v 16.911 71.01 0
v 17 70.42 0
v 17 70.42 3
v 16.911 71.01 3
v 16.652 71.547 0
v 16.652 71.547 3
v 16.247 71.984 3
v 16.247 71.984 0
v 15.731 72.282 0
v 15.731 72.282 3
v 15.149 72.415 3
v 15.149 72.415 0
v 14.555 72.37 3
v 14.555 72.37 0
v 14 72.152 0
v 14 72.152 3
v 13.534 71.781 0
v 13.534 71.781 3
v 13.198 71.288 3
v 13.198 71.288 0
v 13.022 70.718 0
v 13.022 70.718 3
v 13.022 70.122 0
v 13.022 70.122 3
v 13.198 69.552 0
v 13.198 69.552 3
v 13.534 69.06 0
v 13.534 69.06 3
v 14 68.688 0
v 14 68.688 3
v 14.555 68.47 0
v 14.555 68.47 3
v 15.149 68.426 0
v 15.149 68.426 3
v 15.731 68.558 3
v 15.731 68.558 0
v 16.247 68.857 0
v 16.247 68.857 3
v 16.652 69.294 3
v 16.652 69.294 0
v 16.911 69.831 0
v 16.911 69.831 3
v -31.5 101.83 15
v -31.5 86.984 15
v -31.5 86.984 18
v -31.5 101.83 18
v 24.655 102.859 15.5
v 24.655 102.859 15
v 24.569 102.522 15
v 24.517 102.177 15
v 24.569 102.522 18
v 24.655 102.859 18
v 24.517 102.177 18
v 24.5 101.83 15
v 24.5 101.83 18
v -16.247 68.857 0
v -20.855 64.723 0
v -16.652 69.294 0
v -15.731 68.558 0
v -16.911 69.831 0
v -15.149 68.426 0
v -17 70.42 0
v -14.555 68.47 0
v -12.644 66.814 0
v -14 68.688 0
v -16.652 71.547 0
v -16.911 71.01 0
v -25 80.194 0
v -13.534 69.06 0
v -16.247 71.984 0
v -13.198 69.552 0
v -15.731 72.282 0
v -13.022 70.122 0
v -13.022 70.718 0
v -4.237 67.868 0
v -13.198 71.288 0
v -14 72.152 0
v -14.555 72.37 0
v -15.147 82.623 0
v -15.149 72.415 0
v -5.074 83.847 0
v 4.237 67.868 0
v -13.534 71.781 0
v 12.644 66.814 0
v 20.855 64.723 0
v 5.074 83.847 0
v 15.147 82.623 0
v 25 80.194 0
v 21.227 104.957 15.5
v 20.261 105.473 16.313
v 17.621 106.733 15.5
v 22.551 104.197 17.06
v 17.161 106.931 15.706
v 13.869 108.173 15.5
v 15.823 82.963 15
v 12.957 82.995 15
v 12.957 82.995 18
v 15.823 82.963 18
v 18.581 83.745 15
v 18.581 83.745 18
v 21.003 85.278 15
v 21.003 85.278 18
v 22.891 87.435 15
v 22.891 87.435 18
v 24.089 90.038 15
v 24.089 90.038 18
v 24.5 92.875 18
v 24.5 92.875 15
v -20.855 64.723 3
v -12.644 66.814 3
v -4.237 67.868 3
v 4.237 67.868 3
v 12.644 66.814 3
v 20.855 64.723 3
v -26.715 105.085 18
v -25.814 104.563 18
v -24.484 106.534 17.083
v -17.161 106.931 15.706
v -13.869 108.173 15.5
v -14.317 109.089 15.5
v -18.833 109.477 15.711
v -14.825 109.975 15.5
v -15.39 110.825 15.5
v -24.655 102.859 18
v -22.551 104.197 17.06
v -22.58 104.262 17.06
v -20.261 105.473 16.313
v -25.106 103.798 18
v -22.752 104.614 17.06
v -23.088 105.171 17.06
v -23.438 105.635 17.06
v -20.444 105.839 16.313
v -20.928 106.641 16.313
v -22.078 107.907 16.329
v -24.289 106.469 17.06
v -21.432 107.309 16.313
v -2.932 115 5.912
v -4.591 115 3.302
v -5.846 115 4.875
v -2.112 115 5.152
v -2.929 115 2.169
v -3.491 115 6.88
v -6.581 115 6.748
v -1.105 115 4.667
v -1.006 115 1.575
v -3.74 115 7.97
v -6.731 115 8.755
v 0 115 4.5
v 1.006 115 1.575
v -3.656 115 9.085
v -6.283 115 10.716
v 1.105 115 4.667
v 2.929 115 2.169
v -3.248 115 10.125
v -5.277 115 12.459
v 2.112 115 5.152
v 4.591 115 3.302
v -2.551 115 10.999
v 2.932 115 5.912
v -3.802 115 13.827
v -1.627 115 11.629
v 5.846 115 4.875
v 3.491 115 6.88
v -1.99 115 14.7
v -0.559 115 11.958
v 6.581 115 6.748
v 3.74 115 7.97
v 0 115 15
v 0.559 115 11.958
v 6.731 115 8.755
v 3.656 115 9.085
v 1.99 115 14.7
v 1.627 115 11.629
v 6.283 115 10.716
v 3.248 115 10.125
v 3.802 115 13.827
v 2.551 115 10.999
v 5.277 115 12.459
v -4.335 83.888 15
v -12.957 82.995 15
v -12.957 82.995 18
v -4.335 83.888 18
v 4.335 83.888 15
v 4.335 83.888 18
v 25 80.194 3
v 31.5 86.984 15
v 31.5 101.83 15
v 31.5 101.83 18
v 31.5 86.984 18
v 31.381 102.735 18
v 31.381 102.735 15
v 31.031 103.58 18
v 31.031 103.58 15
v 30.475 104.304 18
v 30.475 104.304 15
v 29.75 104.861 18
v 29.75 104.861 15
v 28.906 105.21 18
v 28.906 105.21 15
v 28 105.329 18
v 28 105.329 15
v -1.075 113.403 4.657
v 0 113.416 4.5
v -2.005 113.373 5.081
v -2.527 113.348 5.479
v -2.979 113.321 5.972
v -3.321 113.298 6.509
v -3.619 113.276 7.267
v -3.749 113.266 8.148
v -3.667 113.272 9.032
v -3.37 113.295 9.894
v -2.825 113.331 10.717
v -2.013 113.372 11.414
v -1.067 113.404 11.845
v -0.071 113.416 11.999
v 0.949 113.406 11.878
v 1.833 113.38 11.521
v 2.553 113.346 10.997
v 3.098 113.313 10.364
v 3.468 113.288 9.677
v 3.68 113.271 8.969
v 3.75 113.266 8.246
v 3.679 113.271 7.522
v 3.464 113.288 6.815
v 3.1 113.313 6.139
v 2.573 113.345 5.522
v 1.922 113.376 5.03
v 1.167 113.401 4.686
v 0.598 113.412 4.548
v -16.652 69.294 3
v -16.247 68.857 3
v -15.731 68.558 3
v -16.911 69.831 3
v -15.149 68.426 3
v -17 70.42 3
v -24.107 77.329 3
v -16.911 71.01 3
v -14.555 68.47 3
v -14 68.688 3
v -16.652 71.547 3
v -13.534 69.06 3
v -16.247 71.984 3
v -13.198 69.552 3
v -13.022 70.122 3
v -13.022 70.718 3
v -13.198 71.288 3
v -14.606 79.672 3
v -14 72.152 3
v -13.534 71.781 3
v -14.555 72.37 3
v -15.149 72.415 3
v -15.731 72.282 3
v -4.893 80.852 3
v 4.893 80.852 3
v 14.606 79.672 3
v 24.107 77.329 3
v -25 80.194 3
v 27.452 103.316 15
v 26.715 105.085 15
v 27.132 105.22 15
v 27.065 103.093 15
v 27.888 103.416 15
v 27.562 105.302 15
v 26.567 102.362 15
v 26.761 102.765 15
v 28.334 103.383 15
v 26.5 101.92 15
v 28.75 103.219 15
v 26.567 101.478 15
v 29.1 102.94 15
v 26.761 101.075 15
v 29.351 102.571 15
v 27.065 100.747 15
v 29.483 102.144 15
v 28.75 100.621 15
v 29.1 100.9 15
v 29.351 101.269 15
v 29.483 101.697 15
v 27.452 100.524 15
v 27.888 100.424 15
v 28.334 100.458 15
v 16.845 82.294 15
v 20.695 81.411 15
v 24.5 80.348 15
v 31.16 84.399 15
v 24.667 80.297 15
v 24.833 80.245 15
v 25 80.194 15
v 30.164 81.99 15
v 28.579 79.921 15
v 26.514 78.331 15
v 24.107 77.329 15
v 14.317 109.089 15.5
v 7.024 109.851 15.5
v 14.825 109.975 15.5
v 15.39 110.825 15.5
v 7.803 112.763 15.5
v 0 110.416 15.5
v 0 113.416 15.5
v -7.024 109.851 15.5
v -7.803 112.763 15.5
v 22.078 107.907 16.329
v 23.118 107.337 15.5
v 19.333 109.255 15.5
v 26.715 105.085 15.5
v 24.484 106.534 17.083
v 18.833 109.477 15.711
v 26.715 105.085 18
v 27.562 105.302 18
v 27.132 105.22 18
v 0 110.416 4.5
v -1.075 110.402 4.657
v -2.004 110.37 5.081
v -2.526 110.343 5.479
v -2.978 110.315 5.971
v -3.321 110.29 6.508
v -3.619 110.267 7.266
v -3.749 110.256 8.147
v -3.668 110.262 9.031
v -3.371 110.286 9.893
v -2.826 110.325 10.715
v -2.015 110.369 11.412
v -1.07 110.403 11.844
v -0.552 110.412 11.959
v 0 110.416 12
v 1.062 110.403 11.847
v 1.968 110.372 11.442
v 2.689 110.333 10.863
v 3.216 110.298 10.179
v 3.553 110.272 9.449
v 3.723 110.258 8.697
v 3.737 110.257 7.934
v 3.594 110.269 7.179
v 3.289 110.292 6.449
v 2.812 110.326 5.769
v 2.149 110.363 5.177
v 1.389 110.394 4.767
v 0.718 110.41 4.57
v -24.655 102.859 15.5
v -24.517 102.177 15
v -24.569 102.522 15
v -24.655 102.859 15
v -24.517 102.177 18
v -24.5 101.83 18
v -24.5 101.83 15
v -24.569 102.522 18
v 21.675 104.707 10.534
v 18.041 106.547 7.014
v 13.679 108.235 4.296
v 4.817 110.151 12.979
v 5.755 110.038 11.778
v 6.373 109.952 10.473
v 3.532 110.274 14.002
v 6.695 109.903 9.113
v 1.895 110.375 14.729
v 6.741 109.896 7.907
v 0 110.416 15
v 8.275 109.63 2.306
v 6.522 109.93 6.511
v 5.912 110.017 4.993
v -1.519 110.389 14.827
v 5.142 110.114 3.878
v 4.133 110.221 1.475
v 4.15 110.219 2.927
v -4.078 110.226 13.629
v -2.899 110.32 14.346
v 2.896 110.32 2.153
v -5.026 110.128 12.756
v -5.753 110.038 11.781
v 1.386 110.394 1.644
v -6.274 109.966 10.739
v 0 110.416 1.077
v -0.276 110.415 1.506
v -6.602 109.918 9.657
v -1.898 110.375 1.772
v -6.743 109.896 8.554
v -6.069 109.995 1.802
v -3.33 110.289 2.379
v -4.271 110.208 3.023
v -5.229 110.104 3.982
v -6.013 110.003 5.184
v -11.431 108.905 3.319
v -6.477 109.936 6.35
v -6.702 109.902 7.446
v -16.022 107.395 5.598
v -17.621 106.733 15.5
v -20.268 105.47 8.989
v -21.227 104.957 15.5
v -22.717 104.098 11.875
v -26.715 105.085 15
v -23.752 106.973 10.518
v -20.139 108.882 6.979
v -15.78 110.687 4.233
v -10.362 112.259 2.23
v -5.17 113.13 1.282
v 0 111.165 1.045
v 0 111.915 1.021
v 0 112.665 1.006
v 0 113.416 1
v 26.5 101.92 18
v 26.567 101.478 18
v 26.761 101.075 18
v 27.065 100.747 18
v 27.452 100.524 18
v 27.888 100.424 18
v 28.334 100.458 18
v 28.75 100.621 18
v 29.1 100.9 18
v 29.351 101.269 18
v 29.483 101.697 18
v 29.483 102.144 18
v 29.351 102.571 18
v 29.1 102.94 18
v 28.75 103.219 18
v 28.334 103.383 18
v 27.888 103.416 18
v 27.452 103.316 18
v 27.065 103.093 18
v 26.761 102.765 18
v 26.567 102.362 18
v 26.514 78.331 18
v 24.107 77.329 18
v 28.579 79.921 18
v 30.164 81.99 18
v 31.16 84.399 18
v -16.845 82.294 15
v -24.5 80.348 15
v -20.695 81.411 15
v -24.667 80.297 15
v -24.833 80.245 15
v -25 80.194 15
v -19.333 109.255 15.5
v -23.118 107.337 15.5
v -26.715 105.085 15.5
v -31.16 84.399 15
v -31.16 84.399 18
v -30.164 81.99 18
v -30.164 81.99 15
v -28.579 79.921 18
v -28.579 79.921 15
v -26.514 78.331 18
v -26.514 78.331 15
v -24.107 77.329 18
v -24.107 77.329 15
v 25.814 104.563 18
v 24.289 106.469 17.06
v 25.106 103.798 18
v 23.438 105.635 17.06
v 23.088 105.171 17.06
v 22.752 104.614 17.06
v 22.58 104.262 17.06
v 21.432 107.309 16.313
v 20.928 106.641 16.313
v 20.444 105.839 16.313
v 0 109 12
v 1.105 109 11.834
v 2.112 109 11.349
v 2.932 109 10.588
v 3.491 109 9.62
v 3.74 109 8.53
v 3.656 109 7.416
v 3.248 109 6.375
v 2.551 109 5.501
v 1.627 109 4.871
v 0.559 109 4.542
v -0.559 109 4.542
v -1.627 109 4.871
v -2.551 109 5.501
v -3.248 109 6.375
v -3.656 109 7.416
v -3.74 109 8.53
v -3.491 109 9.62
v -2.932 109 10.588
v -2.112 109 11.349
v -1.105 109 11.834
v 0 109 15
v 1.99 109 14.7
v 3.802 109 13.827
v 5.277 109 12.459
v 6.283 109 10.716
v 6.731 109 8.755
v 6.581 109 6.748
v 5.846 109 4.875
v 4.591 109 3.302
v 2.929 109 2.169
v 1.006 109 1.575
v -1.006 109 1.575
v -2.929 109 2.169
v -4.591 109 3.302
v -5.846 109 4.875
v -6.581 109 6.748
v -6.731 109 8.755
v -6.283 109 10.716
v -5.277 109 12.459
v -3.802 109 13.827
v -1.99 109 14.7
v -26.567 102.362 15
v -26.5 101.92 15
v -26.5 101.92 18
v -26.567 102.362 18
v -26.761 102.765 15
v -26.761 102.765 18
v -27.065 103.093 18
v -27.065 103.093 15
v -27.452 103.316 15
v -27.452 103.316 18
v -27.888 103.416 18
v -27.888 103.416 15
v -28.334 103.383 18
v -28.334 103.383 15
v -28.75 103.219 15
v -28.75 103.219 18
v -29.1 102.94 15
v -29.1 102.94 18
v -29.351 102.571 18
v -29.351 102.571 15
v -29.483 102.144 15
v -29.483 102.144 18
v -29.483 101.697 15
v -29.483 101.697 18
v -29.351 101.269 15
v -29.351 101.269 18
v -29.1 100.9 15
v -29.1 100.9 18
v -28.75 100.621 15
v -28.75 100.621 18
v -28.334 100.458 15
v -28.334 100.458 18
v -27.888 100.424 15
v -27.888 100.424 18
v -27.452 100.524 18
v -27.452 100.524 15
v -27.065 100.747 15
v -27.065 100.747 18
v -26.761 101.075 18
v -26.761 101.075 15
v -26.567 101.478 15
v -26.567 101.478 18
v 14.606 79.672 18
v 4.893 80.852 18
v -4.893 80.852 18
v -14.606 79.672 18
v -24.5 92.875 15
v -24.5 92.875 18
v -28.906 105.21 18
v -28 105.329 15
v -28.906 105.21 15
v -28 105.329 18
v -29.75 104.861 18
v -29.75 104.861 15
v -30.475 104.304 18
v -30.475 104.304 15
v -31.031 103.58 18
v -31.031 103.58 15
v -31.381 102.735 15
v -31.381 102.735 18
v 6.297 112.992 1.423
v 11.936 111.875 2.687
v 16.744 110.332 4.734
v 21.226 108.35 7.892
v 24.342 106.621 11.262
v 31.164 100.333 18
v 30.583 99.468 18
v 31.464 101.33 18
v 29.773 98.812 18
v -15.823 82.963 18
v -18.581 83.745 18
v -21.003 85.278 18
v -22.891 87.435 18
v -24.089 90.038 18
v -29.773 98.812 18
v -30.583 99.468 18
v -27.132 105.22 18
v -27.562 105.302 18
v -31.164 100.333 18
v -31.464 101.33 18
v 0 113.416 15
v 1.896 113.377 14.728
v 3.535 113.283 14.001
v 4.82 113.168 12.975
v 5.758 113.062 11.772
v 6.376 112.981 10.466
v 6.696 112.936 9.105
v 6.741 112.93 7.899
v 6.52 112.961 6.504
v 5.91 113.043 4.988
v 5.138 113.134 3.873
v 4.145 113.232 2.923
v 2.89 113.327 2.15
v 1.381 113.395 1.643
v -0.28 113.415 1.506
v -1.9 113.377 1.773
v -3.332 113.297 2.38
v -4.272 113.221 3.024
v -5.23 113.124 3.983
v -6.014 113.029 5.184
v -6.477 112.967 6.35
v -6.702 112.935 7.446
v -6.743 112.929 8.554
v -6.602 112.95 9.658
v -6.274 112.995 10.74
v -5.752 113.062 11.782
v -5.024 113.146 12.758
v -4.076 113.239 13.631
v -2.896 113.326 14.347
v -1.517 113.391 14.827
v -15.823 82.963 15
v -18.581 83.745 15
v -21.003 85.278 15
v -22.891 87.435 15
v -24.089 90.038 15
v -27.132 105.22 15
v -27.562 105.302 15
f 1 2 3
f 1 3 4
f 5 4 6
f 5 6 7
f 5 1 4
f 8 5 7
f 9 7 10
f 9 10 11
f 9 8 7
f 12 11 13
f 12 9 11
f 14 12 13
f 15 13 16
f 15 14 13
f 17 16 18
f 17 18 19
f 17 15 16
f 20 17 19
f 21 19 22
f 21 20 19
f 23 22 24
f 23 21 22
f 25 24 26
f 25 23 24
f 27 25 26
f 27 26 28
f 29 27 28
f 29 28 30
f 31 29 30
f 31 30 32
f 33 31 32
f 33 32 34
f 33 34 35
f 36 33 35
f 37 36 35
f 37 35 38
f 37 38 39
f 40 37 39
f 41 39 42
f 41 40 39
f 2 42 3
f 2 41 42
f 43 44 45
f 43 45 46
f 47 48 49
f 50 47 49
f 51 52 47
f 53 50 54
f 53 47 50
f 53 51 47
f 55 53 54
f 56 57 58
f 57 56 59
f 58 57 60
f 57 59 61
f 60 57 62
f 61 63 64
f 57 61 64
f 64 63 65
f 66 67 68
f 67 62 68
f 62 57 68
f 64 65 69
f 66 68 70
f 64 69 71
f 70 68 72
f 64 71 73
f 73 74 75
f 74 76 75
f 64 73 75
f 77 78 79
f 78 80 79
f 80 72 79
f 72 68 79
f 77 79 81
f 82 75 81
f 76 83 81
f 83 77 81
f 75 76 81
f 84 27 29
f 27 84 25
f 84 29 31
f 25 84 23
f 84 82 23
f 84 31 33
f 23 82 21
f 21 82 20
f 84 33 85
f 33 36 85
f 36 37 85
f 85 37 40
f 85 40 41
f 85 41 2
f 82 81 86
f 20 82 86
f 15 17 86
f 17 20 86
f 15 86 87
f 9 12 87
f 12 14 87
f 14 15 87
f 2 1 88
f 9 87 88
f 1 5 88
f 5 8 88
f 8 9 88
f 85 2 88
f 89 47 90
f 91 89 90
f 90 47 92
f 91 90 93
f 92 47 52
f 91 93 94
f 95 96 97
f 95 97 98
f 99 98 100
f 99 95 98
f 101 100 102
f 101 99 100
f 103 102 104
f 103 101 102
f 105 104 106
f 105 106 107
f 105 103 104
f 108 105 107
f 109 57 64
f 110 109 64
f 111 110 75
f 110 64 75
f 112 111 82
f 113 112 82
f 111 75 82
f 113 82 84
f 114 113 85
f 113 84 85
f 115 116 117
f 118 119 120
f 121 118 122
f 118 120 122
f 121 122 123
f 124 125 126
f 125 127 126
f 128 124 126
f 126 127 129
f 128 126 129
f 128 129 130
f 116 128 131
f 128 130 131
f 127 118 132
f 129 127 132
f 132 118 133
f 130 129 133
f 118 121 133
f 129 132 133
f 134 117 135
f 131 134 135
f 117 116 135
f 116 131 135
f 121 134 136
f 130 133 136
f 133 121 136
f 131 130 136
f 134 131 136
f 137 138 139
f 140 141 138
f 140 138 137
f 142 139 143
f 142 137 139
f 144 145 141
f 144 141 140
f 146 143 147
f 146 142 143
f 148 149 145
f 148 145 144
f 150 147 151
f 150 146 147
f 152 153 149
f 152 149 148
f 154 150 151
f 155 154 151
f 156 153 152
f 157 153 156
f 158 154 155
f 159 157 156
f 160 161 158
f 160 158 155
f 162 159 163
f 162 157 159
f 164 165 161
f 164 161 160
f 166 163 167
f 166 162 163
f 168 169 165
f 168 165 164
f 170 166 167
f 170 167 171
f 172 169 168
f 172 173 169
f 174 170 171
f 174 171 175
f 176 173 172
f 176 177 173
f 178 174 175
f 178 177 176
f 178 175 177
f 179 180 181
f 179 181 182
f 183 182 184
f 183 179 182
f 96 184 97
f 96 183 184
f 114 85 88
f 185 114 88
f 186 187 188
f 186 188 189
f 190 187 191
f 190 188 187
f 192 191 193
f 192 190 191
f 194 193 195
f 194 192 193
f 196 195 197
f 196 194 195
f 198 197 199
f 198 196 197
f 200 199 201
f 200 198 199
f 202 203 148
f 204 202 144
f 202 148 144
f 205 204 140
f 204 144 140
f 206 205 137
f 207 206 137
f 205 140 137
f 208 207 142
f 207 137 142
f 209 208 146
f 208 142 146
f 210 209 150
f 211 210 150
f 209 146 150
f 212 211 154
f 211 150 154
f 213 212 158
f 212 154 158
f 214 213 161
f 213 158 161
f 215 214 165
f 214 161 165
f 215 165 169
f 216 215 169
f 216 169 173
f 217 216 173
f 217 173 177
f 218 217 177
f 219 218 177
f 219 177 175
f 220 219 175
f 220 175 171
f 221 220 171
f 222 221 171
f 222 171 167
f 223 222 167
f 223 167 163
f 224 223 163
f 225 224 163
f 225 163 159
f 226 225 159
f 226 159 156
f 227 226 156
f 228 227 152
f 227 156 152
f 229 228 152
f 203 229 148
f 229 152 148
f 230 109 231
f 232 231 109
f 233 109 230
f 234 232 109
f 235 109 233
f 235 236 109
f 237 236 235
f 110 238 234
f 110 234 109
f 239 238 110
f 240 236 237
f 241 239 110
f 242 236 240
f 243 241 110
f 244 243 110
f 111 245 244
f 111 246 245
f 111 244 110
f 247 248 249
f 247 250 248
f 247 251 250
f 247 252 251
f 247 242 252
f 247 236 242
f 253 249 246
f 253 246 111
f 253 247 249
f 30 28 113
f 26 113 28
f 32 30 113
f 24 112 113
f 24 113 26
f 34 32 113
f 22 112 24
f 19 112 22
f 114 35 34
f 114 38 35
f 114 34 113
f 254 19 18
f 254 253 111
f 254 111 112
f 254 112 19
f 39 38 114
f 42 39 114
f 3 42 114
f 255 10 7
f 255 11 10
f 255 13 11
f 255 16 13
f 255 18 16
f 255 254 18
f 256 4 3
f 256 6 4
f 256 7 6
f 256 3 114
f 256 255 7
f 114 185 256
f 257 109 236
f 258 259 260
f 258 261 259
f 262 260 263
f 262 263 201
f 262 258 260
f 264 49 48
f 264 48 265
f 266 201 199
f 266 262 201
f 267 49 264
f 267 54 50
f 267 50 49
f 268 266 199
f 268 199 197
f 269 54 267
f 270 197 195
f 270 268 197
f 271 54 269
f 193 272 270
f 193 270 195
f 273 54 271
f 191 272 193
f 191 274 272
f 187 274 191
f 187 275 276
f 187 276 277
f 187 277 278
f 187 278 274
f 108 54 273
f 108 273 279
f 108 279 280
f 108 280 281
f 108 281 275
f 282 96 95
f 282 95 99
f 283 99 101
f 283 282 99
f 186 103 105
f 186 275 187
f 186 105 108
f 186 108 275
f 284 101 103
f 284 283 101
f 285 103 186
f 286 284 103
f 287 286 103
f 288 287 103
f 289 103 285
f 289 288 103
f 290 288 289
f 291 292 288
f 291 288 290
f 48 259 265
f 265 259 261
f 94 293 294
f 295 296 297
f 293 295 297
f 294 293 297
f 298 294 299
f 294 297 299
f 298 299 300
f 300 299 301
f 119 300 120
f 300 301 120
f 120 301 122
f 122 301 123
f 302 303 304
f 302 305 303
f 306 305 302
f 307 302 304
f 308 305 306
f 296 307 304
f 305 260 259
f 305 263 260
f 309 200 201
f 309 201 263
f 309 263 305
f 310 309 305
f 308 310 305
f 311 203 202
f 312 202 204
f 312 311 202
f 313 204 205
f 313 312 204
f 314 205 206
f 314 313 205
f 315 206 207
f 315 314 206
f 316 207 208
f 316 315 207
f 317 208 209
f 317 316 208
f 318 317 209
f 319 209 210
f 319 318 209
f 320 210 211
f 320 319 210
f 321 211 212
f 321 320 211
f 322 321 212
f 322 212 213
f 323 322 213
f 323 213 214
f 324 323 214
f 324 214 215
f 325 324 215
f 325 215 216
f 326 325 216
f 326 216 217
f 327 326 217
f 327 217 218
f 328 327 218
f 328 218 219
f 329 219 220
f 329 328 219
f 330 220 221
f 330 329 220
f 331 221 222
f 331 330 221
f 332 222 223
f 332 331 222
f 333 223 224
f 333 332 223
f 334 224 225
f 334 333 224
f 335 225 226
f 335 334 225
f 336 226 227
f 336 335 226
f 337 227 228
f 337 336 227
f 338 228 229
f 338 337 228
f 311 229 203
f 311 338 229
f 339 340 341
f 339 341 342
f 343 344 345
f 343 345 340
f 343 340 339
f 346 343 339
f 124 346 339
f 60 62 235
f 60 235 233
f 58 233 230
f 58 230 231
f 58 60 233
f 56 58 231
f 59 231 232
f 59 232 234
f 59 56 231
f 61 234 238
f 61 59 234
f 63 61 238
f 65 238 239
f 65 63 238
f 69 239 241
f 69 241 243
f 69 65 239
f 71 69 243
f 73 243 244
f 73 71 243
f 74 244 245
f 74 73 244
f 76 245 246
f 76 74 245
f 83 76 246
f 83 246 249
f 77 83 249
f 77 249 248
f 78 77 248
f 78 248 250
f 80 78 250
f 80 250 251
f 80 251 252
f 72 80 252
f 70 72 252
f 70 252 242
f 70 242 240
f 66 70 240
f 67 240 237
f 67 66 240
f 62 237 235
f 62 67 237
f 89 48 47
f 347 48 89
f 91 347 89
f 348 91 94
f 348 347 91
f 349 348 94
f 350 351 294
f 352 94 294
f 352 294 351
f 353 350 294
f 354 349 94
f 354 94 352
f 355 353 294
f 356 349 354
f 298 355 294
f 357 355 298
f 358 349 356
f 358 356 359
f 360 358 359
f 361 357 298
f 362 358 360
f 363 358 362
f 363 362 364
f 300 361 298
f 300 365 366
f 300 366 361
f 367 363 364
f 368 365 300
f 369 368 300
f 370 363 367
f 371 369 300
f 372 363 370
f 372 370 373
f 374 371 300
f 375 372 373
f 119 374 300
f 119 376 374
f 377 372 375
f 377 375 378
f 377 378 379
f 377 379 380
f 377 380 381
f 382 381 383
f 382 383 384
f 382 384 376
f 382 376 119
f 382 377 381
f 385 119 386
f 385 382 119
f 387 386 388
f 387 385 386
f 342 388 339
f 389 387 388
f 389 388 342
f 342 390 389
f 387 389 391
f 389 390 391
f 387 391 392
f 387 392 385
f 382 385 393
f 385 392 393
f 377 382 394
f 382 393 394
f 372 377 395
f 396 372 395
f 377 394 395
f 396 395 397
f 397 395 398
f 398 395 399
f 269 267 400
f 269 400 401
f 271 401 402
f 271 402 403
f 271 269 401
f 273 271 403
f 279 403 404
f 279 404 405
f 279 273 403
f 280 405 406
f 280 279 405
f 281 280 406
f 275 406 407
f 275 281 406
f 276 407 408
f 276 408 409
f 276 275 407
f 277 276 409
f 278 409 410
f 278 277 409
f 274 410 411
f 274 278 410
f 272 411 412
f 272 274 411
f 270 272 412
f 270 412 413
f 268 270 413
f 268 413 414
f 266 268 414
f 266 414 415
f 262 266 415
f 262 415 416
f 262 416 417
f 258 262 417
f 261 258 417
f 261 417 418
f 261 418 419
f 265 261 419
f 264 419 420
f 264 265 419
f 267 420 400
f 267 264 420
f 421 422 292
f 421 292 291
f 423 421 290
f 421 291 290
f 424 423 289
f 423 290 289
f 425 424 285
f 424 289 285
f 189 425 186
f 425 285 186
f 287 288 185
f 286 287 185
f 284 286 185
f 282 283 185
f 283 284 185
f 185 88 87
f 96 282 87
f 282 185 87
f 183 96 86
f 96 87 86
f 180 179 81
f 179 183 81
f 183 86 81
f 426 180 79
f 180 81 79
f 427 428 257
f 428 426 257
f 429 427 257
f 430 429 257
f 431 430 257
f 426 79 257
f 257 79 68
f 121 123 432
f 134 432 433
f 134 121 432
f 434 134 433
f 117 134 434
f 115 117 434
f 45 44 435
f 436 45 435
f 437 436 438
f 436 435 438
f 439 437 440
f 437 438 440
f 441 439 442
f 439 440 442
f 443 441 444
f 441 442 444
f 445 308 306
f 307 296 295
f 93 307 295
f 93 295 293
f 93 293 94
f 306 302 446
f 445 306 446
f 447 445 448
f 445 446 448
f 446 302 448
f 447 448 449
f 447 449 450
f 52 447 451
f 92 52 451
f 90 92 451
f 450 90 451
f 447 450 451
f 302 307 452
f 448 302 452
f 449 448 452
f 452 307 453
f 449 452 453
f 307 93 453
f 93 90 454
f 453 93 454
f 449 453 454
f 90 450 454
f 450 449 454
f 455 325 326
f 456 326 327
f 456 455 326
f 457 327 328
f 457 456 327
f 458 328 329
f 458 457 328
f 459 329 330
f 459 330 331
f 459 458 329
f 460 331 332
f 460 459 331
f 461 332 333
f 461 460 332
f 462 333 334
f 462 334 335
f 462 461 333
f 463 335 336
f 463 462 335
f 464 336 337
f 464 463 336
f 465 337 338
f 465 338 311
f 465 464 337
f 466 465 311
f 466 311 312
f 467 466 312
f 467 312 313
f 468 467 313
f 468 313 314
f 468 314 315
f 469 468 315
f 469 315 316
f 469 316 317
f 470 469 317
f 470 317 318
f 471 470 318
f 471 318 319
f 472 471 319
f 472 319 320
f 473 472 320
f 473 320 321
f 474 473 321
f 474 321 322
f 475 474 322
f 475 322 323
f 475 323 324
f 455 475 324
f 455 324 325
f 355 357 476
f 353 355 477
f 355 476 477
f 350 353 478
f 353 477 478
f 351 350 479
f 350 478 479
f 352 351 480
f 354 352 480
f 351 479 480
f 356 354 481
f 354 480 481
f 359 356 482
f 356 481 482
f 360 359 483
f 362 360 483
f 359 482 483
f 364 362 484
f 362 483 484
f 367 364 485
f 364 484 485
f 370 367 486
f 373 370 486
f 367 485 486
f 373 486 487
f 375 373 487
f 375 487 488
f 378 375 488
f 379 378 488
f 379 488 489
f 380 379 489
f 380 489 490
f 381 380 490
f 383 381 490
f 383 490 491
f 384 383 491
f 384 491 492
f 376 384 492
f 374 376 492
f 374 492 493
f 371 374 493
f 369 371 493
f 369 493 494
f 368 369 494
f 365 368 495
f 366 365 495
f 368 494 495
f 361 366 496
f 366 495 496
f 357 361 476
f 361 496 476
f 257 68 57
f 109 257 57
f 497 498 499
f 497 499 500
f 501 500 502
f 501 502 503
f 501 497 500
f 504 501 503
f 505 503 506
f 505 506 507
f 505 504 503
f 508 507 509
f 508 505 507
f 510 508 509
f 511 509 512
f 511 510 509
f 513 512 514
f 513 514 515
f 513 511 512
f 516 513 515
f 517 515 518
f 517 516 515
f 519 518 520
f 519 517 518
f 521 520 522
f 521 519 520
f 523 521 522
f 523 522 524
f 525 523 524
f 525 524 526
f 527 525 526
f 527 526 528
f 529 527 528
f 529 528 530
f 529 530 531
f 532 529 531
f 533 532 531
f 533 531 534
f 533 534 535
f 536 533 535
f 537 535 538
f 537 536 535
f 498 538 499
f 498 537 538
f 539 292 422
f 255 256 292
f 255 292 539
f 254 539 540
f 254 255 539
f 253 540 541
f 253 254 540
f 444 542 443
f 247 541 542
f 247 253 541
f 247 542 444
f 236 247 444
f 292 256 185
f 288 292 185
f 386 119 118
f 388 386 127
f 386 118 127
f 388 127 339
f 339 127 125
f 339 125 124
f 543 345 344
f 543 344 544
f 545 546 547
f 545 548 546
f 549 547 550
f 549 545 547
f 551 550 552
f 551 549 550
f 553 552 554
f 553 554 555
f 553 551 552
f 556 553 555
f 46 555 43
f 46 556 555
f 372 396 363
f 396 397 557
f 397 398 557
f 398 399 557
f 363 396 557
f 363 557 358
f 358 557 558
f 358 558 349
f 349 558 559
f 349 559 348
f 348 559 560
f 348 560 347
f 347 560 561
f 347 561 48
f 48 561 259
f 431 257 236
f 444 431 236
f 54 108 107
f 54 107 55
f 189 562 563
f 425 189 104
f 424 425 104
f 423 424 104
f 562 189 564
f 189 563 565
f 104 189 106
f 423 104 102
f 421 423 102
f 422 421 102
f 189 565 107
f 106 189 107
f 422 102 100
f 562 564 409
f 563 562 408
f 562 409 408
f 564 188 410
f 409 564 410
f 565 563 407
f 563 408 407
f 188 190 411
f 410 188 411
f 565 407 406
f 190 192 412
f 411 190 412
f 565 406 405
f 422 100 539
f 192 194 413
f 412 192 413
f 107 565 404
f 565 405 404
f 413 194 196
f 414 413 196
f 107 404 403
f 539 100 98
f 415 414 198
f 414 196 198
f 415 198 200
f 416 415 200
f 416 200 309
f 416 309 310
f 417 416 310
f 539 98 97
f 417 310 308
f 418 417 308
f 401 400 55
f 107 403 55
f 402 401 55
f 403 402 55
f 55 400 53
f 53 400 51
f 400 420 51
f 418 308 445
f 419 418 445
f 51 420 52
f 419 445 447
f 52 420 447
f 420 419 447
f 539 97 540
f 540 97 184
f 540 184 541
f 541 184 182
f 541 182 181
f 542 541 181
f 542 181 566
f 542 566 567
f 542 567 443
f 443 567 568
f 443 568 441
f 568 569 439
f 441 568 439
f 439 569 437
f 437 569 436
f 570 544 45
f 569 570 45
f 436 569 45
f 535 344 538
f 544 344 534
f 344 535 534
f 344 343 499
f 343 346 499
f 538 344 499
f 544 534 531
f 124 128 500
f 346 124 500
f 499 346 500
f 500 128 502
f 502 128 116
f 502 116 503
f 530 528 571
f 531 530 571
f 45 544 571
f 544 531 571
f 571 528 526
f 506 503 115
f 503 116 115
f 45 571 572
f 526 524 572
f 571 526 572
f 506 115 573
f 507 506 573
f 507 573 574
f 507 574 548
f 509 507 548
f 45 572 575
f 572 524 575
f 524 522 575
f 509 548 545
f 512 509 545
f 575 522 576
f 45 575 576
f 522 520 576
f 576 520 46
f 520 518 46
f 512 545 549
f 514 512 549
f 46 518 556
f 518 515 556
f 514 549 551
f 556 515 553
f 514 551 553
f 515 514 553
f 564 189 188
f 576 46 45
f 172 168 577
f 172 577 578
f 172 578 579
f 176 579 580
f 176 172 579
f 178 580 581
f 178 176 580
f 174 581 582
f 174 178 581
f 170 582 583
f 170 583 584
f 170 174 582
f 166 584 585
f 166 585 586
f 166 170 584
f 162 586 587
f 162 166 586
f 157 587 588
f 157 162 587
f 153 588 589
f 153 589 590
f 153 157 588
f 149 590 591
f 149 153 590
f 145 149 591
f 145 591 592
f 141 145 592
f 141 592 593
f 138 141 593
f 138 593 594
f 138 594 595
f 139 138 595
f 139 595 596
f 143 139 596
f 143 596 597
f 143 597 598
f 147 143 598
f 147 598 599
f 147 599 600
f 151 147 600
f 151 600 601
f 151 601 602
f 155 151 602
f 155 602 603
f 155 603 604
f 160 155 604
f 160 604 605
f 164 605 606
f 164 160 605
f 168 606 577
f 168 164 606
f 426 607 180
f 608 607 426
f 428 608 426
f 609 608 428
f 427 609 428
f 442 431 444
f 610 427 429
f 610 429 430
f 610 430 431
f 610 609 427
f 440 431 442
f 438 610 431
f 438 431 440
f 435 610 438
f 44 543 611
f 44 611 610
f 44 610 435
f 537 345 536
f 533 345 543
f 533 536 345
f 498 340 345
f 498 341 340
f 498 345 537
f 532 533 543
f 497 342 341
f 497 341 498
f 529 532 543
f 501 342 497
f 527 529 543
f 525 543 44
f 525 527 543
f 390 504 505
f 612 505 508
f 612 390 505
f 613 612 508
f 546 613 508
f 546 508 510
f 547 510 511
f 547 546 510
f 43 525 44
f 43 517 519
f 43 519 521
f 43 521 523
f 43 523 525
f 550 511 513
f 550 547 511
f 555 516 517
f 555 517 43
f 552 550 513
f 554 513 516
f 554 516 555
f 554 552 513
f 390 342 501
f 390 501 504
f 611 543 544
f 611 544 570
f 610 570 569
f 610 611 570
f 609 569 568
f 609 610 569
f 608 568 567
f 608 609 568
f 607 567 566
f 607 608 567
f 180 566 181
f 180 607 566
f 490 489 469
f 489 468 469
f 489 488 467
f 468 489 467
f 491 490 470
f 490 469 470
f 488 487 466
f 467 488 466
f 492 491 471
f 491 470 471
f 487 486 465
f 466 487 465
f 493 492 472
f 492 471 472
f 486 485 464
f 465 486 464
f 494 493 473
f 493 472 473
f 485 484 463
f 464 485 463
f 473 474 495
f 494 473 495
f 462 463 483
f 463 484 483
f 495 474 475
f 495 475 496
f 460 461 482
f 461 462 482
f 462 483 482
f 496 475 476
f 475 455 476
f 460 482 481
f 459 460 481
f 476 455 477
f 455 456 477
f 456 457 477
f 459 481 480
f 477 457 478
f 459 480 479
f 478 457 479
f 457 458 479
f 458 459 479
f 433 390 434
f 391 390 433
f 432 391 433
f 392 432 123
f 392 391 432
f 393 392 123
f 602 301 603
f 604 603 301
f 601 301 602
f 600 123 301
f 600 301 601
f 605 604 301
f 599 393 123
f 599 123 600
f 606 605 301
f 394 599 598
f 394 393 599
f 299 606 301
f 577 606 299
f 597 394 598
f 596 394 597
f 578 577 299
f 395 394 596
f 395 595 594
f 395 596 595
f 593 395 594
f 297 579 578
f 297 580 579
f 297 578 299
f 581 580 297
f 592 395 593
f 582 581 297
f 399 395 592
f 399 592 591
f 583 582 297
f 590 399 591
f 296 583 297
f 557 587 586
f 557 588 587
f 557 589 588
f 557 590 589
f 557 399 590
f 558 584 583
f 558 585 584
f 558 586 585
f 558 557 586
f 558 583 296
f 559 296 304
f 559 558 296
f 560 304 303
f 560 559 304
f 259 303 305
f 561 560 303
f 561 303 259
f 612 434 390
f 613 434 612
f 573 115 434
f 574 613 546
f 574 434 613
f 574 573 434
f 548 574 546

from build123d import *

# Parameters (mm, degrees)
SKETCH1_R                 = 2
BOSS_EXTRUDE1_DEPTH       = 3
BOSS_EXTRUDE2_DEPTH       = 12
SKETCH3_R                 = 1.5
BOSS_EXTRUDE3_DEPTH       = 3
FILLET1_R                 = 10
FILLET3_R                 = 3.5
BOSS_EXTRUDE6_DEPTH       = 14
BOSS_EXTRUDE7_DEPTH       = 0.5
BOSS_EXTRUDE8_START       = -14
BOSS_EXTRUDE8_DEPTH       = 14
FILLET7_R                 = 30
FILLET11_R                = 30
CUT_EXTRUDE3_REACH        = 52.603
CUT_EXTRUDE3_END_RADIUS   = 47
SKETCH12_R                = 3.75
BOSS_EXTRUDE9_REACH       = 64
BOSS_EXTRUDE9_END_RADIUS  = 47
SKETCH13_R                = 6.75
SKETCH13_R_2              = 3.75
BOSS_EXTRUDE10_REACH      = 59.242
BOSS_EXTRUDE10_END_RADIUS = 44
SKETCH14_R                = 6.75
SKETCH14_R_2              = 3.75


# Some blends are built 0.0001 mm under size
with BuildPart() as part:
    # Sketch1 → Boss-Extrude1 (new body)
    with BuildSketch(Plane.XY):
        with BuildLine():
            Line((20.854716842, 64.723108589), (25, 80.193515947))
            ThreePointArc((25, 80.193515947), (0, 84), (-25, 80.193515947))
            Line((-25, 80.193515947), (-20.854716842, 64.723108589))
            ThreePointArc((-20.854716842, 64.723108589), (0, 68), (20.854716842, 64.723108589))
        make_face()
        with Locations((15, 70.420167566)):
            Circle(SKETCH1_R, mode=Mode.SUBTRACT)
        with Locations(Location((-15, 70.420167566, 0), (0, 0, 180))):
            Circle(SKETCH1_R, mode=Mode.SUBTRACT)
    extrude(amount=BOSS_EXTRUDE1_DEPTH)

    # Sketch2 → Boss-Extrude2 (add)
    with BuildSketch(Plane.XY.offset(3)):
        with BuildLine():
            Line((-25, 80.193515947), (-24.107142857, 77.329461806))
            ThreePointArc((-24.107142857, 77.329461806), (0, 81), (24.107142857, 77.329461806))
            Line((24.107142857, 77.329461806), (25, 80.193515947))
            ThreePointArc((25, 80.193515947), (0, 84), (-25, 80.193515947))
        make_face()
    extrude(amount=BOSS_EXTRUDE2_DEPTH)

    # Sketch3 → Boss-Extrude3 (add)
    with BuildSketch(Plane.XY.offset(15)):
        with BuildLine():
            Line((-31.5, 77.329461806), (-31.5, 105.329461806))
            Line((-31.5, 105.329461806), (-24.5, 105.329461806))
            Line((-24.5, 105.329461806), (-24.5, 80.347681983))
            ThreePointArc((-24.5, 80.347681983), (0, 84), (24.5, 80.347681983))
            Line((24.5, 80.347681983), (24.5, 105.329461806))
            Line((24.5, 105.329461806), (31.5, 105.329461806))
            Line((31.5, 105.329461806), (31.5, 77.329461806))
            Line((31.5, 77.329461806), (24.107142857, 77.329461806))
            ThreePointArc((24.107142857, 77.329461806), (0, 81), (-24.107142857, 77.329461806))
            Line((-24.107142857, 77.329461806), (-31.5, 77.329461806))
        make_face()
        with Locations((-28, 101.920167566)):
            Circle(SKETCH3_R, mode=Mode.SUBTRACT)
        with Locations(Location((28, 101.920167566, 0), (0, 0, 180))):
            Circle(SKETCH3_R, mode=Mode.SUBTRACT)
    extrude(amount=BOSS_EXTRUDE3_DEPTH)

    # Fillet1
    # the kernel refuses this fillet: 10 mm, written as the material it adds along each edge
    with BuildSketch(Plane(origin=(24.5, 80.347681983, 15), x_dir=(-0.9747000358663407, 0.22351697940459464, 0), z_dir=(0, 0, 1))) as fillet1_piece_1:
        with BuildLine():
            CenterArc((12.54704984, -9.975125536), FILLET1_R, 94.042076765, 98.87360977)
            Line((2.800049481, -12.21029533), (0, 0))
            ThreePointArc((0, 0), (5.9210797, -0.208945494), (11.8421594, 0))
        make_face()
    extrude(amount=3)
    with BuildSketch(Plane(origin=(-24.5, 80.347681983, 15), x_dir=(0.9747000358663402, 0.22351697940459697, 0), z_dir=(0, 0, 1))) as fillet1_piece_2:
        with BuildLine():
            CenterArc((12.54704984, 9.975125536), FILLET1_R, 167.084313465, 98.87360977)
            Line((2.800049481, 12.21029533), (0, 0))
            ThreePointArc((0, 0), (5.9210797, 0.208945494), (11.8421594, 0))
        make_face()
    extrude(amount=3)
    # the kernel refuses this fillet: 10 mm, written as the material it takes off along each edge
    with BuildSketch(Plane(origin=(31.5, 77.329461806, 15), x_dir=(0, 1, 0), z_dir=(0, 0, 1))) as fillet1_2_piece_1:
        with BuildLine():
            CenterArc((9.654160042, 10), FILLET1_R, 195.112449543, 74.887550457)
            Line((0, 7.392857143), (0, 0))
            Line((0, 0), (9.654160042, 0))
        make_face()
    extrude(amount=27.135400106, mode=Mode.SUBTRACT)
    with BuildSketch(Plane(origin=(-31.5, 77.329461806, 15), x_dir=(0, 1, 0), z_dir=(0, 0, 1))) as fillet1_2_piece_2:
        with BuildLine():
            CenterArc((9.654160042, -10), FILLET1_R, 90, 74.887550457)
            Line((0, -7.392857143), (0, 0))
            Line((0, 0), (9.654160042, 0))
        make_face()
    extrude(amount=27.135400106, mode=Mode.SUBTRACT)

    # Fillet3
    fillet3_edges = [part.edges().sort_by_distance(p)[0] for p in [
        (31.5, 105.329461806, 16.5),
        (24.5, 105.329461806, 16.5),
        (-24.5, 105.329461806, 16.5),
        (-31.5, 105.329461806, 16.5),
    ]]
    fillet(fillet3_edges, radius=FILLET3_R - 0.0001)  # a hair under: the kernel refuses the full size



with BuildPart() as body_2:
    # Sketch9 → Boss-Extrude6 (new body)
    with BuildSketch(Plane(origin=(0, 0, 15), x_dir=(-1, 0, 0), z_dir=(0, 0, -1))):
        with BuildLine():
            ThreePointArc((24.654911386, 102.8592104), (0, 110.415619131), (-24.654911386, 102.8592104))
            ThreePointArc((-24.654911386, 102.8592104), (-25.431275444, 104.2067826), (-26.71481938, 105.084966494))
            ThreePointArc((-26.71481938, 105.084966494), (0, 113.415619131), (26.71481938, 105.084966494))
            ThreePointArc((26.71481938, 105.084966494), (25.431275444, 104.2067826), (24.654911386, 102.8592104))
        make_face()
    extrude(amount=BOSS_EXTRUDE6_DEPTH)


with BuildPart() as part_1:
    add(part.part)

    add(body_2.part)  # Boss-Extrude7 merges body 2
    # Sketch10 → Boss-Extrude7 (add)
    with BuildSketch(Plane.XY.offset(15)):
        with BuildLine():
            ThreePointArc((-24.654911386, 102.8592104), (-25.431275444, 104.2067826), (-26.71481938, 105.084966494))
            ThreePointArc((-26.71481938, 105.084966494), (0, 113.415619131), (26.71481938, 105.084966494))
            ThreePointArc((26.71481938, 105.084966494), (25.431275444, 104.2067826), (24.654911386, 102.8592104))
            ThreePointArc((24.654911386, 102.8592104), (0, 110.415619131), (-24.654911386, 102.8592104))
        make_face()
    extrude(amount=BOSS_EXTRUDE7_DEPTH)

    # Sketch11 → Boss-Extrude8 (add)
    with BuildSketch(Plane(origin=(0, 0, 1), x_dir=(-1, 0, 0), z_dir=(0, 0, -1)).offset(BOSS_EXTRUDE8_START)):
        with BuildLine():
            Line((-26.71481938, 105.084966494), (-24.654911386, 102.8592104))
            ThreePointArc((-24.654911386, 102.8592104), (-25.431275444, 104.2067826), (-26.71481938, 105.084966494))
        make_face()
        with BuildLine():
            Line((26.71481938, 105.084966494), (24.654911386, 102.8592104))
            ThreePointArc((24.654911386, 102.8592104), (25.431275444, 104.2067826), (26.71481938, 105.084966494))
        make_face()
    extrude(amount=BOSS_EXTRUDE8_DEPTH)

    # Fillet7
    # the kernel refuses this fillet: 30 mm, written as the material it takes off along each edge
    with BuildSketch(Plane(origin=(69.80741828, 151.647053217, 1), x_dir=(-0.7339213016528682, 0.6792345125066597, 0), z_dir=(-0.6792345125066598, -0.7339213016528682, 0))) as fillet7_piece_1_section:
        with BuildLine():
            CenterArc((25.377155081, -30), FILLET7_R, 90, 57.769047365)
            Line((0, -14), (0, 0))
            Line((0, 0), (25.377155081, 0))
        make_face()
    fillet7_piece_1 = extrude(amount=129.918465817, mode=Mode.PRIVATE)
    fillet7_piece_1 = fillet7_piece_1 - Plane(origin=(0, 0, 1), x_dir=(0.2976190476190481, 0.9546847136590859, 0), z_dir=(0, 0, -1)) * Cylinder(84, 362, mode=Mode.PRIVATE)
    add(fillet7_piece_1, mode=Mode.SUBTRACT)
    with BuildSketch(Plane(origin=(-69.80741828, 151.647053217, 1), x_dir=(0, 0, 1), z_dir=(0.6792345125066636, -0.7339213016528646, 0))) as fillet7_piece_2_section:
        with BuildLine():
            CenterArc((30, -25.377155081), FILLET7_R, 122.230952636, 57.769047365)
            Line((0, -25.377155081), (0, 0))
            Line((0, 0), (14, 0))
        make_face()
    fillet7_piece_2 = extrude(amount=129.918465817, mode=Mode.PRIVATE)
    fillet7_piece_2 = fillet7_piece_2 - Plane(origin=(0, 0, 1), x_dir=(0.2976190476190481, 0.9546847136590859, 0), z_dir=(0, 0, -1)) * Cylinder(84, 362, mode=Mode.PRIVATE)
    add(fillet7_piece_2, mode=Mode.SUBTRACT)

    # Fillet11
    # the kernel refuses this fillet: 30 mm, written as the material it adds along each edge
    with BuildSketch(Plane(origin=(27.9999, 101.829561806, 15.5), x_dir=(0.5609336863803128, 0.8278607367690491, 0), z_dir=(0.8278607367690491, -0.5609336863803128, 0))) as fillet11_piece_1_section:
        with BuildLine():
            CenterArc((15.489478808, 30), FILLET11_R, 246.443535691, 23.556464309)
            Line((3.4999, 2.5), (3.4999, 0))
            Line((3.4999, 0), (15.489478808, 0))
        make_face()
    fillet11_piece_1 = revolve(axis=Axis((27.9999, 101.829561806, 15.5), (0, 0, 1)), revolution_arc=359.64, mode=Mode.PRIVATE)
    fillet11_piece_1 = fillet11_piece_1 & Plane(origin=(0, 66.415619131, 15.5), x_dir=(0.5684004123362708, 0.8227520715598091, 0), z_dir=(0, 0, 1)) * Cylinder(47, 62, mode=Mode.PRIVATE)
    fillet11_piece_1 = fillet11_piece_1 - Plane(origin=(0, 66.415619131, 15.5), x_dir=(-0.5603388951384309, 0.8282634379199909, 0), z_dir=(0, 0, 1)) * Cylinder(44, 62, mode=Mode.PRIVATE)
    fillet11_piece_1 = split(fillet11_piece_1, bisect_by=Plane(origin=(31.5, 101.829561806, 15.5), z_dir=(-1, 0, 0)), keep=Keep.TOP, mode=Mode.PRIVATE)
    add(fillet11_piece_1)
    with BuildSketch(Plane(origin=(-27.9999, 101.829561806, 15.5), x_dir=(-0.5661241822221539, 0.8243199684001945, 0), z_dir=(0.8243199684001945, 0.5661241822221539, 0))) as fillet11_piece_2_section:
        with BuildLine():
            CenterArc((15.489478808, 30), FILLET11_R, 246.443535691, 23.556464309)
            Line((3.4999, 2.5), (3.4999, 0))
            Line((3.4999, 0), (15.489478808, 0))
        make_face()
    fillet11_piece_2 = revolve(axis=Axis((-27.9999, 101.829561806, 15.5), (0, 0, 1)), revolution_arc=359.64, mode=Mode.PRIVATE)
    fillet11_piece_2 = fillet11_piece_2 & Plane(origin=(0, 66.415619131, 15.5), x_dir=(0.5684004123362708, 0.8227520715598091, 0), z_dir=(0, 0, 1)) * Cylinder(47, 62, mode=Mode.PRIVATE)
    fillet11_piece_2 = fillet11_piece_2 - Plane(origin=(0, 66.415619131, 15.5), x_dir=(-0.5603388951384309, 0.8282634379199909, 0), z_dir=(0, 0, 1)) * Cylinder(44, 62, mode=Mode.PRIVATE)
    fillet11_piece_2 = split(fillet11_piece_2, bisect_by=Plane(origin=(-31.5, 101.829561806, 15.5), z_dir=(1, 0, 0)), keep=Keep.TOP, mode=Mode.PRIVATE)
    add(fillet11_piece_2)

    # Cut-Extrude3: up to this cylinder (the profile starts inside it)
    cut_extrude3_end = Plane(origin=(0, 66.415619131, 8.250105), z_dir=(0, 0, -1)) * Cylinder(CUT_EXTRUDE3_END_RADIUS, 200.206, mode=Mode.PRIVATE)
    # Sketch12 → Cut-Extrude3 (cut, up to the surface)
    with BuildSketch(Plane(origin=(0, 100, 0), x_dir=(1, 0, 0), z_dir=(0, 1, 0)), mode=Mode.PRIVATE) as cut_extrude3_sk1:
        with Locations(Location((0, -8.250104745, 0), (0, 0, 90))):
            Circle(SKETCH12_R)
    cut_extrude3_tool1 = extrude(cut_extrude3_sk1.sketch, amount=CUT_EXTRUDE3_REACH, mode=Mode.PRIVATE) & cut_extrude3_end
    add(cut_extrude3_tool1.solids().sort_by_distance((0, 100, 8.250105))[0], mode=Mode.SUBTRACT)

    # Boss-Extrude9: up to this cylinder (the profile starts outside it)
    boss_extrude9_end = Plane(origin=(0, 66.415619131, 1.691024), z_dir=(0, 0, -1)) * Cylinder(BOSS_EXTRUDE9_END_RADIUS, 223, mode=Mode.PRIVATE)
    # Sketch13 → Boss-Extrude9 (add, up to the surface)
    with BuildSketch(Plane(origin=(0, 115, 0), x_dir=(1, 0, 0), z_dir=(0, 1, 0)), mode=Mode.PRIVATE) as boss_extrude9_sk1:
        with Locations(Location((0, -8.250104745, 0), (0, 0, 270))):
            Circle(SKETCH13_R)
        with Locations(Location((0, -8.250104745, 0), (0, 0, 90))):
            Circle(SKETCH13_R_2, mode=Mode.SUBTRACT)
    boss_extrude9_tool1 = extrude(boss_extrude9_sk1.sketch, amount=-BOSS_EXTRUDE9_REACH, mode=Mode.PRIVATE) - boss_extrude9_end
    add(boss_extrude9_tool1.solids().sort_by_distance((0, 115, 1.691024))[0])

    # Boss-Extrude10: up to this cylinder (the profile starts inside it)
    boss_extrude10_end = Plane(origin=(0, 66.415619131, 1.691024), z_dir=(0, 0, -1)) * Cylinder(BOSS_EXTRUDE10_END_RADIUS, 207.484, mode=Mode.PRIVATE)
    # Sketch14 → Boss-Extrude10 (add, up to the surface)
    with BuildSketch(Plane(origin=(0, 109, 0), x_dir=(1, 0, 0), z_dir=(0, 1, 0)), mode=Mode.PRIVATE) as boss_extrude10_sk1:
        with Locations(Location((0, -8.250104745, 0), (0, 0, 270))):
            Circle(SKETCH14_R)
        with Locations(Location((0, -8.250104745, 0), (0, 0, 270))):
            Circle(SKETCH14_R_2, mode=Mode.SUBTRACT)
    boss_extrude10_tool1 = extrude(boss_extrude10_sk1.sketch, amount=BOSS_EXTRUDE10_REACH, mode=Mode.PRIVATE) & boss_extrude10_end
    add(boss_extrude10_tool1.solids().sort_by_distance((0, 109, 1.691024))[0])


solid = part_1.part
